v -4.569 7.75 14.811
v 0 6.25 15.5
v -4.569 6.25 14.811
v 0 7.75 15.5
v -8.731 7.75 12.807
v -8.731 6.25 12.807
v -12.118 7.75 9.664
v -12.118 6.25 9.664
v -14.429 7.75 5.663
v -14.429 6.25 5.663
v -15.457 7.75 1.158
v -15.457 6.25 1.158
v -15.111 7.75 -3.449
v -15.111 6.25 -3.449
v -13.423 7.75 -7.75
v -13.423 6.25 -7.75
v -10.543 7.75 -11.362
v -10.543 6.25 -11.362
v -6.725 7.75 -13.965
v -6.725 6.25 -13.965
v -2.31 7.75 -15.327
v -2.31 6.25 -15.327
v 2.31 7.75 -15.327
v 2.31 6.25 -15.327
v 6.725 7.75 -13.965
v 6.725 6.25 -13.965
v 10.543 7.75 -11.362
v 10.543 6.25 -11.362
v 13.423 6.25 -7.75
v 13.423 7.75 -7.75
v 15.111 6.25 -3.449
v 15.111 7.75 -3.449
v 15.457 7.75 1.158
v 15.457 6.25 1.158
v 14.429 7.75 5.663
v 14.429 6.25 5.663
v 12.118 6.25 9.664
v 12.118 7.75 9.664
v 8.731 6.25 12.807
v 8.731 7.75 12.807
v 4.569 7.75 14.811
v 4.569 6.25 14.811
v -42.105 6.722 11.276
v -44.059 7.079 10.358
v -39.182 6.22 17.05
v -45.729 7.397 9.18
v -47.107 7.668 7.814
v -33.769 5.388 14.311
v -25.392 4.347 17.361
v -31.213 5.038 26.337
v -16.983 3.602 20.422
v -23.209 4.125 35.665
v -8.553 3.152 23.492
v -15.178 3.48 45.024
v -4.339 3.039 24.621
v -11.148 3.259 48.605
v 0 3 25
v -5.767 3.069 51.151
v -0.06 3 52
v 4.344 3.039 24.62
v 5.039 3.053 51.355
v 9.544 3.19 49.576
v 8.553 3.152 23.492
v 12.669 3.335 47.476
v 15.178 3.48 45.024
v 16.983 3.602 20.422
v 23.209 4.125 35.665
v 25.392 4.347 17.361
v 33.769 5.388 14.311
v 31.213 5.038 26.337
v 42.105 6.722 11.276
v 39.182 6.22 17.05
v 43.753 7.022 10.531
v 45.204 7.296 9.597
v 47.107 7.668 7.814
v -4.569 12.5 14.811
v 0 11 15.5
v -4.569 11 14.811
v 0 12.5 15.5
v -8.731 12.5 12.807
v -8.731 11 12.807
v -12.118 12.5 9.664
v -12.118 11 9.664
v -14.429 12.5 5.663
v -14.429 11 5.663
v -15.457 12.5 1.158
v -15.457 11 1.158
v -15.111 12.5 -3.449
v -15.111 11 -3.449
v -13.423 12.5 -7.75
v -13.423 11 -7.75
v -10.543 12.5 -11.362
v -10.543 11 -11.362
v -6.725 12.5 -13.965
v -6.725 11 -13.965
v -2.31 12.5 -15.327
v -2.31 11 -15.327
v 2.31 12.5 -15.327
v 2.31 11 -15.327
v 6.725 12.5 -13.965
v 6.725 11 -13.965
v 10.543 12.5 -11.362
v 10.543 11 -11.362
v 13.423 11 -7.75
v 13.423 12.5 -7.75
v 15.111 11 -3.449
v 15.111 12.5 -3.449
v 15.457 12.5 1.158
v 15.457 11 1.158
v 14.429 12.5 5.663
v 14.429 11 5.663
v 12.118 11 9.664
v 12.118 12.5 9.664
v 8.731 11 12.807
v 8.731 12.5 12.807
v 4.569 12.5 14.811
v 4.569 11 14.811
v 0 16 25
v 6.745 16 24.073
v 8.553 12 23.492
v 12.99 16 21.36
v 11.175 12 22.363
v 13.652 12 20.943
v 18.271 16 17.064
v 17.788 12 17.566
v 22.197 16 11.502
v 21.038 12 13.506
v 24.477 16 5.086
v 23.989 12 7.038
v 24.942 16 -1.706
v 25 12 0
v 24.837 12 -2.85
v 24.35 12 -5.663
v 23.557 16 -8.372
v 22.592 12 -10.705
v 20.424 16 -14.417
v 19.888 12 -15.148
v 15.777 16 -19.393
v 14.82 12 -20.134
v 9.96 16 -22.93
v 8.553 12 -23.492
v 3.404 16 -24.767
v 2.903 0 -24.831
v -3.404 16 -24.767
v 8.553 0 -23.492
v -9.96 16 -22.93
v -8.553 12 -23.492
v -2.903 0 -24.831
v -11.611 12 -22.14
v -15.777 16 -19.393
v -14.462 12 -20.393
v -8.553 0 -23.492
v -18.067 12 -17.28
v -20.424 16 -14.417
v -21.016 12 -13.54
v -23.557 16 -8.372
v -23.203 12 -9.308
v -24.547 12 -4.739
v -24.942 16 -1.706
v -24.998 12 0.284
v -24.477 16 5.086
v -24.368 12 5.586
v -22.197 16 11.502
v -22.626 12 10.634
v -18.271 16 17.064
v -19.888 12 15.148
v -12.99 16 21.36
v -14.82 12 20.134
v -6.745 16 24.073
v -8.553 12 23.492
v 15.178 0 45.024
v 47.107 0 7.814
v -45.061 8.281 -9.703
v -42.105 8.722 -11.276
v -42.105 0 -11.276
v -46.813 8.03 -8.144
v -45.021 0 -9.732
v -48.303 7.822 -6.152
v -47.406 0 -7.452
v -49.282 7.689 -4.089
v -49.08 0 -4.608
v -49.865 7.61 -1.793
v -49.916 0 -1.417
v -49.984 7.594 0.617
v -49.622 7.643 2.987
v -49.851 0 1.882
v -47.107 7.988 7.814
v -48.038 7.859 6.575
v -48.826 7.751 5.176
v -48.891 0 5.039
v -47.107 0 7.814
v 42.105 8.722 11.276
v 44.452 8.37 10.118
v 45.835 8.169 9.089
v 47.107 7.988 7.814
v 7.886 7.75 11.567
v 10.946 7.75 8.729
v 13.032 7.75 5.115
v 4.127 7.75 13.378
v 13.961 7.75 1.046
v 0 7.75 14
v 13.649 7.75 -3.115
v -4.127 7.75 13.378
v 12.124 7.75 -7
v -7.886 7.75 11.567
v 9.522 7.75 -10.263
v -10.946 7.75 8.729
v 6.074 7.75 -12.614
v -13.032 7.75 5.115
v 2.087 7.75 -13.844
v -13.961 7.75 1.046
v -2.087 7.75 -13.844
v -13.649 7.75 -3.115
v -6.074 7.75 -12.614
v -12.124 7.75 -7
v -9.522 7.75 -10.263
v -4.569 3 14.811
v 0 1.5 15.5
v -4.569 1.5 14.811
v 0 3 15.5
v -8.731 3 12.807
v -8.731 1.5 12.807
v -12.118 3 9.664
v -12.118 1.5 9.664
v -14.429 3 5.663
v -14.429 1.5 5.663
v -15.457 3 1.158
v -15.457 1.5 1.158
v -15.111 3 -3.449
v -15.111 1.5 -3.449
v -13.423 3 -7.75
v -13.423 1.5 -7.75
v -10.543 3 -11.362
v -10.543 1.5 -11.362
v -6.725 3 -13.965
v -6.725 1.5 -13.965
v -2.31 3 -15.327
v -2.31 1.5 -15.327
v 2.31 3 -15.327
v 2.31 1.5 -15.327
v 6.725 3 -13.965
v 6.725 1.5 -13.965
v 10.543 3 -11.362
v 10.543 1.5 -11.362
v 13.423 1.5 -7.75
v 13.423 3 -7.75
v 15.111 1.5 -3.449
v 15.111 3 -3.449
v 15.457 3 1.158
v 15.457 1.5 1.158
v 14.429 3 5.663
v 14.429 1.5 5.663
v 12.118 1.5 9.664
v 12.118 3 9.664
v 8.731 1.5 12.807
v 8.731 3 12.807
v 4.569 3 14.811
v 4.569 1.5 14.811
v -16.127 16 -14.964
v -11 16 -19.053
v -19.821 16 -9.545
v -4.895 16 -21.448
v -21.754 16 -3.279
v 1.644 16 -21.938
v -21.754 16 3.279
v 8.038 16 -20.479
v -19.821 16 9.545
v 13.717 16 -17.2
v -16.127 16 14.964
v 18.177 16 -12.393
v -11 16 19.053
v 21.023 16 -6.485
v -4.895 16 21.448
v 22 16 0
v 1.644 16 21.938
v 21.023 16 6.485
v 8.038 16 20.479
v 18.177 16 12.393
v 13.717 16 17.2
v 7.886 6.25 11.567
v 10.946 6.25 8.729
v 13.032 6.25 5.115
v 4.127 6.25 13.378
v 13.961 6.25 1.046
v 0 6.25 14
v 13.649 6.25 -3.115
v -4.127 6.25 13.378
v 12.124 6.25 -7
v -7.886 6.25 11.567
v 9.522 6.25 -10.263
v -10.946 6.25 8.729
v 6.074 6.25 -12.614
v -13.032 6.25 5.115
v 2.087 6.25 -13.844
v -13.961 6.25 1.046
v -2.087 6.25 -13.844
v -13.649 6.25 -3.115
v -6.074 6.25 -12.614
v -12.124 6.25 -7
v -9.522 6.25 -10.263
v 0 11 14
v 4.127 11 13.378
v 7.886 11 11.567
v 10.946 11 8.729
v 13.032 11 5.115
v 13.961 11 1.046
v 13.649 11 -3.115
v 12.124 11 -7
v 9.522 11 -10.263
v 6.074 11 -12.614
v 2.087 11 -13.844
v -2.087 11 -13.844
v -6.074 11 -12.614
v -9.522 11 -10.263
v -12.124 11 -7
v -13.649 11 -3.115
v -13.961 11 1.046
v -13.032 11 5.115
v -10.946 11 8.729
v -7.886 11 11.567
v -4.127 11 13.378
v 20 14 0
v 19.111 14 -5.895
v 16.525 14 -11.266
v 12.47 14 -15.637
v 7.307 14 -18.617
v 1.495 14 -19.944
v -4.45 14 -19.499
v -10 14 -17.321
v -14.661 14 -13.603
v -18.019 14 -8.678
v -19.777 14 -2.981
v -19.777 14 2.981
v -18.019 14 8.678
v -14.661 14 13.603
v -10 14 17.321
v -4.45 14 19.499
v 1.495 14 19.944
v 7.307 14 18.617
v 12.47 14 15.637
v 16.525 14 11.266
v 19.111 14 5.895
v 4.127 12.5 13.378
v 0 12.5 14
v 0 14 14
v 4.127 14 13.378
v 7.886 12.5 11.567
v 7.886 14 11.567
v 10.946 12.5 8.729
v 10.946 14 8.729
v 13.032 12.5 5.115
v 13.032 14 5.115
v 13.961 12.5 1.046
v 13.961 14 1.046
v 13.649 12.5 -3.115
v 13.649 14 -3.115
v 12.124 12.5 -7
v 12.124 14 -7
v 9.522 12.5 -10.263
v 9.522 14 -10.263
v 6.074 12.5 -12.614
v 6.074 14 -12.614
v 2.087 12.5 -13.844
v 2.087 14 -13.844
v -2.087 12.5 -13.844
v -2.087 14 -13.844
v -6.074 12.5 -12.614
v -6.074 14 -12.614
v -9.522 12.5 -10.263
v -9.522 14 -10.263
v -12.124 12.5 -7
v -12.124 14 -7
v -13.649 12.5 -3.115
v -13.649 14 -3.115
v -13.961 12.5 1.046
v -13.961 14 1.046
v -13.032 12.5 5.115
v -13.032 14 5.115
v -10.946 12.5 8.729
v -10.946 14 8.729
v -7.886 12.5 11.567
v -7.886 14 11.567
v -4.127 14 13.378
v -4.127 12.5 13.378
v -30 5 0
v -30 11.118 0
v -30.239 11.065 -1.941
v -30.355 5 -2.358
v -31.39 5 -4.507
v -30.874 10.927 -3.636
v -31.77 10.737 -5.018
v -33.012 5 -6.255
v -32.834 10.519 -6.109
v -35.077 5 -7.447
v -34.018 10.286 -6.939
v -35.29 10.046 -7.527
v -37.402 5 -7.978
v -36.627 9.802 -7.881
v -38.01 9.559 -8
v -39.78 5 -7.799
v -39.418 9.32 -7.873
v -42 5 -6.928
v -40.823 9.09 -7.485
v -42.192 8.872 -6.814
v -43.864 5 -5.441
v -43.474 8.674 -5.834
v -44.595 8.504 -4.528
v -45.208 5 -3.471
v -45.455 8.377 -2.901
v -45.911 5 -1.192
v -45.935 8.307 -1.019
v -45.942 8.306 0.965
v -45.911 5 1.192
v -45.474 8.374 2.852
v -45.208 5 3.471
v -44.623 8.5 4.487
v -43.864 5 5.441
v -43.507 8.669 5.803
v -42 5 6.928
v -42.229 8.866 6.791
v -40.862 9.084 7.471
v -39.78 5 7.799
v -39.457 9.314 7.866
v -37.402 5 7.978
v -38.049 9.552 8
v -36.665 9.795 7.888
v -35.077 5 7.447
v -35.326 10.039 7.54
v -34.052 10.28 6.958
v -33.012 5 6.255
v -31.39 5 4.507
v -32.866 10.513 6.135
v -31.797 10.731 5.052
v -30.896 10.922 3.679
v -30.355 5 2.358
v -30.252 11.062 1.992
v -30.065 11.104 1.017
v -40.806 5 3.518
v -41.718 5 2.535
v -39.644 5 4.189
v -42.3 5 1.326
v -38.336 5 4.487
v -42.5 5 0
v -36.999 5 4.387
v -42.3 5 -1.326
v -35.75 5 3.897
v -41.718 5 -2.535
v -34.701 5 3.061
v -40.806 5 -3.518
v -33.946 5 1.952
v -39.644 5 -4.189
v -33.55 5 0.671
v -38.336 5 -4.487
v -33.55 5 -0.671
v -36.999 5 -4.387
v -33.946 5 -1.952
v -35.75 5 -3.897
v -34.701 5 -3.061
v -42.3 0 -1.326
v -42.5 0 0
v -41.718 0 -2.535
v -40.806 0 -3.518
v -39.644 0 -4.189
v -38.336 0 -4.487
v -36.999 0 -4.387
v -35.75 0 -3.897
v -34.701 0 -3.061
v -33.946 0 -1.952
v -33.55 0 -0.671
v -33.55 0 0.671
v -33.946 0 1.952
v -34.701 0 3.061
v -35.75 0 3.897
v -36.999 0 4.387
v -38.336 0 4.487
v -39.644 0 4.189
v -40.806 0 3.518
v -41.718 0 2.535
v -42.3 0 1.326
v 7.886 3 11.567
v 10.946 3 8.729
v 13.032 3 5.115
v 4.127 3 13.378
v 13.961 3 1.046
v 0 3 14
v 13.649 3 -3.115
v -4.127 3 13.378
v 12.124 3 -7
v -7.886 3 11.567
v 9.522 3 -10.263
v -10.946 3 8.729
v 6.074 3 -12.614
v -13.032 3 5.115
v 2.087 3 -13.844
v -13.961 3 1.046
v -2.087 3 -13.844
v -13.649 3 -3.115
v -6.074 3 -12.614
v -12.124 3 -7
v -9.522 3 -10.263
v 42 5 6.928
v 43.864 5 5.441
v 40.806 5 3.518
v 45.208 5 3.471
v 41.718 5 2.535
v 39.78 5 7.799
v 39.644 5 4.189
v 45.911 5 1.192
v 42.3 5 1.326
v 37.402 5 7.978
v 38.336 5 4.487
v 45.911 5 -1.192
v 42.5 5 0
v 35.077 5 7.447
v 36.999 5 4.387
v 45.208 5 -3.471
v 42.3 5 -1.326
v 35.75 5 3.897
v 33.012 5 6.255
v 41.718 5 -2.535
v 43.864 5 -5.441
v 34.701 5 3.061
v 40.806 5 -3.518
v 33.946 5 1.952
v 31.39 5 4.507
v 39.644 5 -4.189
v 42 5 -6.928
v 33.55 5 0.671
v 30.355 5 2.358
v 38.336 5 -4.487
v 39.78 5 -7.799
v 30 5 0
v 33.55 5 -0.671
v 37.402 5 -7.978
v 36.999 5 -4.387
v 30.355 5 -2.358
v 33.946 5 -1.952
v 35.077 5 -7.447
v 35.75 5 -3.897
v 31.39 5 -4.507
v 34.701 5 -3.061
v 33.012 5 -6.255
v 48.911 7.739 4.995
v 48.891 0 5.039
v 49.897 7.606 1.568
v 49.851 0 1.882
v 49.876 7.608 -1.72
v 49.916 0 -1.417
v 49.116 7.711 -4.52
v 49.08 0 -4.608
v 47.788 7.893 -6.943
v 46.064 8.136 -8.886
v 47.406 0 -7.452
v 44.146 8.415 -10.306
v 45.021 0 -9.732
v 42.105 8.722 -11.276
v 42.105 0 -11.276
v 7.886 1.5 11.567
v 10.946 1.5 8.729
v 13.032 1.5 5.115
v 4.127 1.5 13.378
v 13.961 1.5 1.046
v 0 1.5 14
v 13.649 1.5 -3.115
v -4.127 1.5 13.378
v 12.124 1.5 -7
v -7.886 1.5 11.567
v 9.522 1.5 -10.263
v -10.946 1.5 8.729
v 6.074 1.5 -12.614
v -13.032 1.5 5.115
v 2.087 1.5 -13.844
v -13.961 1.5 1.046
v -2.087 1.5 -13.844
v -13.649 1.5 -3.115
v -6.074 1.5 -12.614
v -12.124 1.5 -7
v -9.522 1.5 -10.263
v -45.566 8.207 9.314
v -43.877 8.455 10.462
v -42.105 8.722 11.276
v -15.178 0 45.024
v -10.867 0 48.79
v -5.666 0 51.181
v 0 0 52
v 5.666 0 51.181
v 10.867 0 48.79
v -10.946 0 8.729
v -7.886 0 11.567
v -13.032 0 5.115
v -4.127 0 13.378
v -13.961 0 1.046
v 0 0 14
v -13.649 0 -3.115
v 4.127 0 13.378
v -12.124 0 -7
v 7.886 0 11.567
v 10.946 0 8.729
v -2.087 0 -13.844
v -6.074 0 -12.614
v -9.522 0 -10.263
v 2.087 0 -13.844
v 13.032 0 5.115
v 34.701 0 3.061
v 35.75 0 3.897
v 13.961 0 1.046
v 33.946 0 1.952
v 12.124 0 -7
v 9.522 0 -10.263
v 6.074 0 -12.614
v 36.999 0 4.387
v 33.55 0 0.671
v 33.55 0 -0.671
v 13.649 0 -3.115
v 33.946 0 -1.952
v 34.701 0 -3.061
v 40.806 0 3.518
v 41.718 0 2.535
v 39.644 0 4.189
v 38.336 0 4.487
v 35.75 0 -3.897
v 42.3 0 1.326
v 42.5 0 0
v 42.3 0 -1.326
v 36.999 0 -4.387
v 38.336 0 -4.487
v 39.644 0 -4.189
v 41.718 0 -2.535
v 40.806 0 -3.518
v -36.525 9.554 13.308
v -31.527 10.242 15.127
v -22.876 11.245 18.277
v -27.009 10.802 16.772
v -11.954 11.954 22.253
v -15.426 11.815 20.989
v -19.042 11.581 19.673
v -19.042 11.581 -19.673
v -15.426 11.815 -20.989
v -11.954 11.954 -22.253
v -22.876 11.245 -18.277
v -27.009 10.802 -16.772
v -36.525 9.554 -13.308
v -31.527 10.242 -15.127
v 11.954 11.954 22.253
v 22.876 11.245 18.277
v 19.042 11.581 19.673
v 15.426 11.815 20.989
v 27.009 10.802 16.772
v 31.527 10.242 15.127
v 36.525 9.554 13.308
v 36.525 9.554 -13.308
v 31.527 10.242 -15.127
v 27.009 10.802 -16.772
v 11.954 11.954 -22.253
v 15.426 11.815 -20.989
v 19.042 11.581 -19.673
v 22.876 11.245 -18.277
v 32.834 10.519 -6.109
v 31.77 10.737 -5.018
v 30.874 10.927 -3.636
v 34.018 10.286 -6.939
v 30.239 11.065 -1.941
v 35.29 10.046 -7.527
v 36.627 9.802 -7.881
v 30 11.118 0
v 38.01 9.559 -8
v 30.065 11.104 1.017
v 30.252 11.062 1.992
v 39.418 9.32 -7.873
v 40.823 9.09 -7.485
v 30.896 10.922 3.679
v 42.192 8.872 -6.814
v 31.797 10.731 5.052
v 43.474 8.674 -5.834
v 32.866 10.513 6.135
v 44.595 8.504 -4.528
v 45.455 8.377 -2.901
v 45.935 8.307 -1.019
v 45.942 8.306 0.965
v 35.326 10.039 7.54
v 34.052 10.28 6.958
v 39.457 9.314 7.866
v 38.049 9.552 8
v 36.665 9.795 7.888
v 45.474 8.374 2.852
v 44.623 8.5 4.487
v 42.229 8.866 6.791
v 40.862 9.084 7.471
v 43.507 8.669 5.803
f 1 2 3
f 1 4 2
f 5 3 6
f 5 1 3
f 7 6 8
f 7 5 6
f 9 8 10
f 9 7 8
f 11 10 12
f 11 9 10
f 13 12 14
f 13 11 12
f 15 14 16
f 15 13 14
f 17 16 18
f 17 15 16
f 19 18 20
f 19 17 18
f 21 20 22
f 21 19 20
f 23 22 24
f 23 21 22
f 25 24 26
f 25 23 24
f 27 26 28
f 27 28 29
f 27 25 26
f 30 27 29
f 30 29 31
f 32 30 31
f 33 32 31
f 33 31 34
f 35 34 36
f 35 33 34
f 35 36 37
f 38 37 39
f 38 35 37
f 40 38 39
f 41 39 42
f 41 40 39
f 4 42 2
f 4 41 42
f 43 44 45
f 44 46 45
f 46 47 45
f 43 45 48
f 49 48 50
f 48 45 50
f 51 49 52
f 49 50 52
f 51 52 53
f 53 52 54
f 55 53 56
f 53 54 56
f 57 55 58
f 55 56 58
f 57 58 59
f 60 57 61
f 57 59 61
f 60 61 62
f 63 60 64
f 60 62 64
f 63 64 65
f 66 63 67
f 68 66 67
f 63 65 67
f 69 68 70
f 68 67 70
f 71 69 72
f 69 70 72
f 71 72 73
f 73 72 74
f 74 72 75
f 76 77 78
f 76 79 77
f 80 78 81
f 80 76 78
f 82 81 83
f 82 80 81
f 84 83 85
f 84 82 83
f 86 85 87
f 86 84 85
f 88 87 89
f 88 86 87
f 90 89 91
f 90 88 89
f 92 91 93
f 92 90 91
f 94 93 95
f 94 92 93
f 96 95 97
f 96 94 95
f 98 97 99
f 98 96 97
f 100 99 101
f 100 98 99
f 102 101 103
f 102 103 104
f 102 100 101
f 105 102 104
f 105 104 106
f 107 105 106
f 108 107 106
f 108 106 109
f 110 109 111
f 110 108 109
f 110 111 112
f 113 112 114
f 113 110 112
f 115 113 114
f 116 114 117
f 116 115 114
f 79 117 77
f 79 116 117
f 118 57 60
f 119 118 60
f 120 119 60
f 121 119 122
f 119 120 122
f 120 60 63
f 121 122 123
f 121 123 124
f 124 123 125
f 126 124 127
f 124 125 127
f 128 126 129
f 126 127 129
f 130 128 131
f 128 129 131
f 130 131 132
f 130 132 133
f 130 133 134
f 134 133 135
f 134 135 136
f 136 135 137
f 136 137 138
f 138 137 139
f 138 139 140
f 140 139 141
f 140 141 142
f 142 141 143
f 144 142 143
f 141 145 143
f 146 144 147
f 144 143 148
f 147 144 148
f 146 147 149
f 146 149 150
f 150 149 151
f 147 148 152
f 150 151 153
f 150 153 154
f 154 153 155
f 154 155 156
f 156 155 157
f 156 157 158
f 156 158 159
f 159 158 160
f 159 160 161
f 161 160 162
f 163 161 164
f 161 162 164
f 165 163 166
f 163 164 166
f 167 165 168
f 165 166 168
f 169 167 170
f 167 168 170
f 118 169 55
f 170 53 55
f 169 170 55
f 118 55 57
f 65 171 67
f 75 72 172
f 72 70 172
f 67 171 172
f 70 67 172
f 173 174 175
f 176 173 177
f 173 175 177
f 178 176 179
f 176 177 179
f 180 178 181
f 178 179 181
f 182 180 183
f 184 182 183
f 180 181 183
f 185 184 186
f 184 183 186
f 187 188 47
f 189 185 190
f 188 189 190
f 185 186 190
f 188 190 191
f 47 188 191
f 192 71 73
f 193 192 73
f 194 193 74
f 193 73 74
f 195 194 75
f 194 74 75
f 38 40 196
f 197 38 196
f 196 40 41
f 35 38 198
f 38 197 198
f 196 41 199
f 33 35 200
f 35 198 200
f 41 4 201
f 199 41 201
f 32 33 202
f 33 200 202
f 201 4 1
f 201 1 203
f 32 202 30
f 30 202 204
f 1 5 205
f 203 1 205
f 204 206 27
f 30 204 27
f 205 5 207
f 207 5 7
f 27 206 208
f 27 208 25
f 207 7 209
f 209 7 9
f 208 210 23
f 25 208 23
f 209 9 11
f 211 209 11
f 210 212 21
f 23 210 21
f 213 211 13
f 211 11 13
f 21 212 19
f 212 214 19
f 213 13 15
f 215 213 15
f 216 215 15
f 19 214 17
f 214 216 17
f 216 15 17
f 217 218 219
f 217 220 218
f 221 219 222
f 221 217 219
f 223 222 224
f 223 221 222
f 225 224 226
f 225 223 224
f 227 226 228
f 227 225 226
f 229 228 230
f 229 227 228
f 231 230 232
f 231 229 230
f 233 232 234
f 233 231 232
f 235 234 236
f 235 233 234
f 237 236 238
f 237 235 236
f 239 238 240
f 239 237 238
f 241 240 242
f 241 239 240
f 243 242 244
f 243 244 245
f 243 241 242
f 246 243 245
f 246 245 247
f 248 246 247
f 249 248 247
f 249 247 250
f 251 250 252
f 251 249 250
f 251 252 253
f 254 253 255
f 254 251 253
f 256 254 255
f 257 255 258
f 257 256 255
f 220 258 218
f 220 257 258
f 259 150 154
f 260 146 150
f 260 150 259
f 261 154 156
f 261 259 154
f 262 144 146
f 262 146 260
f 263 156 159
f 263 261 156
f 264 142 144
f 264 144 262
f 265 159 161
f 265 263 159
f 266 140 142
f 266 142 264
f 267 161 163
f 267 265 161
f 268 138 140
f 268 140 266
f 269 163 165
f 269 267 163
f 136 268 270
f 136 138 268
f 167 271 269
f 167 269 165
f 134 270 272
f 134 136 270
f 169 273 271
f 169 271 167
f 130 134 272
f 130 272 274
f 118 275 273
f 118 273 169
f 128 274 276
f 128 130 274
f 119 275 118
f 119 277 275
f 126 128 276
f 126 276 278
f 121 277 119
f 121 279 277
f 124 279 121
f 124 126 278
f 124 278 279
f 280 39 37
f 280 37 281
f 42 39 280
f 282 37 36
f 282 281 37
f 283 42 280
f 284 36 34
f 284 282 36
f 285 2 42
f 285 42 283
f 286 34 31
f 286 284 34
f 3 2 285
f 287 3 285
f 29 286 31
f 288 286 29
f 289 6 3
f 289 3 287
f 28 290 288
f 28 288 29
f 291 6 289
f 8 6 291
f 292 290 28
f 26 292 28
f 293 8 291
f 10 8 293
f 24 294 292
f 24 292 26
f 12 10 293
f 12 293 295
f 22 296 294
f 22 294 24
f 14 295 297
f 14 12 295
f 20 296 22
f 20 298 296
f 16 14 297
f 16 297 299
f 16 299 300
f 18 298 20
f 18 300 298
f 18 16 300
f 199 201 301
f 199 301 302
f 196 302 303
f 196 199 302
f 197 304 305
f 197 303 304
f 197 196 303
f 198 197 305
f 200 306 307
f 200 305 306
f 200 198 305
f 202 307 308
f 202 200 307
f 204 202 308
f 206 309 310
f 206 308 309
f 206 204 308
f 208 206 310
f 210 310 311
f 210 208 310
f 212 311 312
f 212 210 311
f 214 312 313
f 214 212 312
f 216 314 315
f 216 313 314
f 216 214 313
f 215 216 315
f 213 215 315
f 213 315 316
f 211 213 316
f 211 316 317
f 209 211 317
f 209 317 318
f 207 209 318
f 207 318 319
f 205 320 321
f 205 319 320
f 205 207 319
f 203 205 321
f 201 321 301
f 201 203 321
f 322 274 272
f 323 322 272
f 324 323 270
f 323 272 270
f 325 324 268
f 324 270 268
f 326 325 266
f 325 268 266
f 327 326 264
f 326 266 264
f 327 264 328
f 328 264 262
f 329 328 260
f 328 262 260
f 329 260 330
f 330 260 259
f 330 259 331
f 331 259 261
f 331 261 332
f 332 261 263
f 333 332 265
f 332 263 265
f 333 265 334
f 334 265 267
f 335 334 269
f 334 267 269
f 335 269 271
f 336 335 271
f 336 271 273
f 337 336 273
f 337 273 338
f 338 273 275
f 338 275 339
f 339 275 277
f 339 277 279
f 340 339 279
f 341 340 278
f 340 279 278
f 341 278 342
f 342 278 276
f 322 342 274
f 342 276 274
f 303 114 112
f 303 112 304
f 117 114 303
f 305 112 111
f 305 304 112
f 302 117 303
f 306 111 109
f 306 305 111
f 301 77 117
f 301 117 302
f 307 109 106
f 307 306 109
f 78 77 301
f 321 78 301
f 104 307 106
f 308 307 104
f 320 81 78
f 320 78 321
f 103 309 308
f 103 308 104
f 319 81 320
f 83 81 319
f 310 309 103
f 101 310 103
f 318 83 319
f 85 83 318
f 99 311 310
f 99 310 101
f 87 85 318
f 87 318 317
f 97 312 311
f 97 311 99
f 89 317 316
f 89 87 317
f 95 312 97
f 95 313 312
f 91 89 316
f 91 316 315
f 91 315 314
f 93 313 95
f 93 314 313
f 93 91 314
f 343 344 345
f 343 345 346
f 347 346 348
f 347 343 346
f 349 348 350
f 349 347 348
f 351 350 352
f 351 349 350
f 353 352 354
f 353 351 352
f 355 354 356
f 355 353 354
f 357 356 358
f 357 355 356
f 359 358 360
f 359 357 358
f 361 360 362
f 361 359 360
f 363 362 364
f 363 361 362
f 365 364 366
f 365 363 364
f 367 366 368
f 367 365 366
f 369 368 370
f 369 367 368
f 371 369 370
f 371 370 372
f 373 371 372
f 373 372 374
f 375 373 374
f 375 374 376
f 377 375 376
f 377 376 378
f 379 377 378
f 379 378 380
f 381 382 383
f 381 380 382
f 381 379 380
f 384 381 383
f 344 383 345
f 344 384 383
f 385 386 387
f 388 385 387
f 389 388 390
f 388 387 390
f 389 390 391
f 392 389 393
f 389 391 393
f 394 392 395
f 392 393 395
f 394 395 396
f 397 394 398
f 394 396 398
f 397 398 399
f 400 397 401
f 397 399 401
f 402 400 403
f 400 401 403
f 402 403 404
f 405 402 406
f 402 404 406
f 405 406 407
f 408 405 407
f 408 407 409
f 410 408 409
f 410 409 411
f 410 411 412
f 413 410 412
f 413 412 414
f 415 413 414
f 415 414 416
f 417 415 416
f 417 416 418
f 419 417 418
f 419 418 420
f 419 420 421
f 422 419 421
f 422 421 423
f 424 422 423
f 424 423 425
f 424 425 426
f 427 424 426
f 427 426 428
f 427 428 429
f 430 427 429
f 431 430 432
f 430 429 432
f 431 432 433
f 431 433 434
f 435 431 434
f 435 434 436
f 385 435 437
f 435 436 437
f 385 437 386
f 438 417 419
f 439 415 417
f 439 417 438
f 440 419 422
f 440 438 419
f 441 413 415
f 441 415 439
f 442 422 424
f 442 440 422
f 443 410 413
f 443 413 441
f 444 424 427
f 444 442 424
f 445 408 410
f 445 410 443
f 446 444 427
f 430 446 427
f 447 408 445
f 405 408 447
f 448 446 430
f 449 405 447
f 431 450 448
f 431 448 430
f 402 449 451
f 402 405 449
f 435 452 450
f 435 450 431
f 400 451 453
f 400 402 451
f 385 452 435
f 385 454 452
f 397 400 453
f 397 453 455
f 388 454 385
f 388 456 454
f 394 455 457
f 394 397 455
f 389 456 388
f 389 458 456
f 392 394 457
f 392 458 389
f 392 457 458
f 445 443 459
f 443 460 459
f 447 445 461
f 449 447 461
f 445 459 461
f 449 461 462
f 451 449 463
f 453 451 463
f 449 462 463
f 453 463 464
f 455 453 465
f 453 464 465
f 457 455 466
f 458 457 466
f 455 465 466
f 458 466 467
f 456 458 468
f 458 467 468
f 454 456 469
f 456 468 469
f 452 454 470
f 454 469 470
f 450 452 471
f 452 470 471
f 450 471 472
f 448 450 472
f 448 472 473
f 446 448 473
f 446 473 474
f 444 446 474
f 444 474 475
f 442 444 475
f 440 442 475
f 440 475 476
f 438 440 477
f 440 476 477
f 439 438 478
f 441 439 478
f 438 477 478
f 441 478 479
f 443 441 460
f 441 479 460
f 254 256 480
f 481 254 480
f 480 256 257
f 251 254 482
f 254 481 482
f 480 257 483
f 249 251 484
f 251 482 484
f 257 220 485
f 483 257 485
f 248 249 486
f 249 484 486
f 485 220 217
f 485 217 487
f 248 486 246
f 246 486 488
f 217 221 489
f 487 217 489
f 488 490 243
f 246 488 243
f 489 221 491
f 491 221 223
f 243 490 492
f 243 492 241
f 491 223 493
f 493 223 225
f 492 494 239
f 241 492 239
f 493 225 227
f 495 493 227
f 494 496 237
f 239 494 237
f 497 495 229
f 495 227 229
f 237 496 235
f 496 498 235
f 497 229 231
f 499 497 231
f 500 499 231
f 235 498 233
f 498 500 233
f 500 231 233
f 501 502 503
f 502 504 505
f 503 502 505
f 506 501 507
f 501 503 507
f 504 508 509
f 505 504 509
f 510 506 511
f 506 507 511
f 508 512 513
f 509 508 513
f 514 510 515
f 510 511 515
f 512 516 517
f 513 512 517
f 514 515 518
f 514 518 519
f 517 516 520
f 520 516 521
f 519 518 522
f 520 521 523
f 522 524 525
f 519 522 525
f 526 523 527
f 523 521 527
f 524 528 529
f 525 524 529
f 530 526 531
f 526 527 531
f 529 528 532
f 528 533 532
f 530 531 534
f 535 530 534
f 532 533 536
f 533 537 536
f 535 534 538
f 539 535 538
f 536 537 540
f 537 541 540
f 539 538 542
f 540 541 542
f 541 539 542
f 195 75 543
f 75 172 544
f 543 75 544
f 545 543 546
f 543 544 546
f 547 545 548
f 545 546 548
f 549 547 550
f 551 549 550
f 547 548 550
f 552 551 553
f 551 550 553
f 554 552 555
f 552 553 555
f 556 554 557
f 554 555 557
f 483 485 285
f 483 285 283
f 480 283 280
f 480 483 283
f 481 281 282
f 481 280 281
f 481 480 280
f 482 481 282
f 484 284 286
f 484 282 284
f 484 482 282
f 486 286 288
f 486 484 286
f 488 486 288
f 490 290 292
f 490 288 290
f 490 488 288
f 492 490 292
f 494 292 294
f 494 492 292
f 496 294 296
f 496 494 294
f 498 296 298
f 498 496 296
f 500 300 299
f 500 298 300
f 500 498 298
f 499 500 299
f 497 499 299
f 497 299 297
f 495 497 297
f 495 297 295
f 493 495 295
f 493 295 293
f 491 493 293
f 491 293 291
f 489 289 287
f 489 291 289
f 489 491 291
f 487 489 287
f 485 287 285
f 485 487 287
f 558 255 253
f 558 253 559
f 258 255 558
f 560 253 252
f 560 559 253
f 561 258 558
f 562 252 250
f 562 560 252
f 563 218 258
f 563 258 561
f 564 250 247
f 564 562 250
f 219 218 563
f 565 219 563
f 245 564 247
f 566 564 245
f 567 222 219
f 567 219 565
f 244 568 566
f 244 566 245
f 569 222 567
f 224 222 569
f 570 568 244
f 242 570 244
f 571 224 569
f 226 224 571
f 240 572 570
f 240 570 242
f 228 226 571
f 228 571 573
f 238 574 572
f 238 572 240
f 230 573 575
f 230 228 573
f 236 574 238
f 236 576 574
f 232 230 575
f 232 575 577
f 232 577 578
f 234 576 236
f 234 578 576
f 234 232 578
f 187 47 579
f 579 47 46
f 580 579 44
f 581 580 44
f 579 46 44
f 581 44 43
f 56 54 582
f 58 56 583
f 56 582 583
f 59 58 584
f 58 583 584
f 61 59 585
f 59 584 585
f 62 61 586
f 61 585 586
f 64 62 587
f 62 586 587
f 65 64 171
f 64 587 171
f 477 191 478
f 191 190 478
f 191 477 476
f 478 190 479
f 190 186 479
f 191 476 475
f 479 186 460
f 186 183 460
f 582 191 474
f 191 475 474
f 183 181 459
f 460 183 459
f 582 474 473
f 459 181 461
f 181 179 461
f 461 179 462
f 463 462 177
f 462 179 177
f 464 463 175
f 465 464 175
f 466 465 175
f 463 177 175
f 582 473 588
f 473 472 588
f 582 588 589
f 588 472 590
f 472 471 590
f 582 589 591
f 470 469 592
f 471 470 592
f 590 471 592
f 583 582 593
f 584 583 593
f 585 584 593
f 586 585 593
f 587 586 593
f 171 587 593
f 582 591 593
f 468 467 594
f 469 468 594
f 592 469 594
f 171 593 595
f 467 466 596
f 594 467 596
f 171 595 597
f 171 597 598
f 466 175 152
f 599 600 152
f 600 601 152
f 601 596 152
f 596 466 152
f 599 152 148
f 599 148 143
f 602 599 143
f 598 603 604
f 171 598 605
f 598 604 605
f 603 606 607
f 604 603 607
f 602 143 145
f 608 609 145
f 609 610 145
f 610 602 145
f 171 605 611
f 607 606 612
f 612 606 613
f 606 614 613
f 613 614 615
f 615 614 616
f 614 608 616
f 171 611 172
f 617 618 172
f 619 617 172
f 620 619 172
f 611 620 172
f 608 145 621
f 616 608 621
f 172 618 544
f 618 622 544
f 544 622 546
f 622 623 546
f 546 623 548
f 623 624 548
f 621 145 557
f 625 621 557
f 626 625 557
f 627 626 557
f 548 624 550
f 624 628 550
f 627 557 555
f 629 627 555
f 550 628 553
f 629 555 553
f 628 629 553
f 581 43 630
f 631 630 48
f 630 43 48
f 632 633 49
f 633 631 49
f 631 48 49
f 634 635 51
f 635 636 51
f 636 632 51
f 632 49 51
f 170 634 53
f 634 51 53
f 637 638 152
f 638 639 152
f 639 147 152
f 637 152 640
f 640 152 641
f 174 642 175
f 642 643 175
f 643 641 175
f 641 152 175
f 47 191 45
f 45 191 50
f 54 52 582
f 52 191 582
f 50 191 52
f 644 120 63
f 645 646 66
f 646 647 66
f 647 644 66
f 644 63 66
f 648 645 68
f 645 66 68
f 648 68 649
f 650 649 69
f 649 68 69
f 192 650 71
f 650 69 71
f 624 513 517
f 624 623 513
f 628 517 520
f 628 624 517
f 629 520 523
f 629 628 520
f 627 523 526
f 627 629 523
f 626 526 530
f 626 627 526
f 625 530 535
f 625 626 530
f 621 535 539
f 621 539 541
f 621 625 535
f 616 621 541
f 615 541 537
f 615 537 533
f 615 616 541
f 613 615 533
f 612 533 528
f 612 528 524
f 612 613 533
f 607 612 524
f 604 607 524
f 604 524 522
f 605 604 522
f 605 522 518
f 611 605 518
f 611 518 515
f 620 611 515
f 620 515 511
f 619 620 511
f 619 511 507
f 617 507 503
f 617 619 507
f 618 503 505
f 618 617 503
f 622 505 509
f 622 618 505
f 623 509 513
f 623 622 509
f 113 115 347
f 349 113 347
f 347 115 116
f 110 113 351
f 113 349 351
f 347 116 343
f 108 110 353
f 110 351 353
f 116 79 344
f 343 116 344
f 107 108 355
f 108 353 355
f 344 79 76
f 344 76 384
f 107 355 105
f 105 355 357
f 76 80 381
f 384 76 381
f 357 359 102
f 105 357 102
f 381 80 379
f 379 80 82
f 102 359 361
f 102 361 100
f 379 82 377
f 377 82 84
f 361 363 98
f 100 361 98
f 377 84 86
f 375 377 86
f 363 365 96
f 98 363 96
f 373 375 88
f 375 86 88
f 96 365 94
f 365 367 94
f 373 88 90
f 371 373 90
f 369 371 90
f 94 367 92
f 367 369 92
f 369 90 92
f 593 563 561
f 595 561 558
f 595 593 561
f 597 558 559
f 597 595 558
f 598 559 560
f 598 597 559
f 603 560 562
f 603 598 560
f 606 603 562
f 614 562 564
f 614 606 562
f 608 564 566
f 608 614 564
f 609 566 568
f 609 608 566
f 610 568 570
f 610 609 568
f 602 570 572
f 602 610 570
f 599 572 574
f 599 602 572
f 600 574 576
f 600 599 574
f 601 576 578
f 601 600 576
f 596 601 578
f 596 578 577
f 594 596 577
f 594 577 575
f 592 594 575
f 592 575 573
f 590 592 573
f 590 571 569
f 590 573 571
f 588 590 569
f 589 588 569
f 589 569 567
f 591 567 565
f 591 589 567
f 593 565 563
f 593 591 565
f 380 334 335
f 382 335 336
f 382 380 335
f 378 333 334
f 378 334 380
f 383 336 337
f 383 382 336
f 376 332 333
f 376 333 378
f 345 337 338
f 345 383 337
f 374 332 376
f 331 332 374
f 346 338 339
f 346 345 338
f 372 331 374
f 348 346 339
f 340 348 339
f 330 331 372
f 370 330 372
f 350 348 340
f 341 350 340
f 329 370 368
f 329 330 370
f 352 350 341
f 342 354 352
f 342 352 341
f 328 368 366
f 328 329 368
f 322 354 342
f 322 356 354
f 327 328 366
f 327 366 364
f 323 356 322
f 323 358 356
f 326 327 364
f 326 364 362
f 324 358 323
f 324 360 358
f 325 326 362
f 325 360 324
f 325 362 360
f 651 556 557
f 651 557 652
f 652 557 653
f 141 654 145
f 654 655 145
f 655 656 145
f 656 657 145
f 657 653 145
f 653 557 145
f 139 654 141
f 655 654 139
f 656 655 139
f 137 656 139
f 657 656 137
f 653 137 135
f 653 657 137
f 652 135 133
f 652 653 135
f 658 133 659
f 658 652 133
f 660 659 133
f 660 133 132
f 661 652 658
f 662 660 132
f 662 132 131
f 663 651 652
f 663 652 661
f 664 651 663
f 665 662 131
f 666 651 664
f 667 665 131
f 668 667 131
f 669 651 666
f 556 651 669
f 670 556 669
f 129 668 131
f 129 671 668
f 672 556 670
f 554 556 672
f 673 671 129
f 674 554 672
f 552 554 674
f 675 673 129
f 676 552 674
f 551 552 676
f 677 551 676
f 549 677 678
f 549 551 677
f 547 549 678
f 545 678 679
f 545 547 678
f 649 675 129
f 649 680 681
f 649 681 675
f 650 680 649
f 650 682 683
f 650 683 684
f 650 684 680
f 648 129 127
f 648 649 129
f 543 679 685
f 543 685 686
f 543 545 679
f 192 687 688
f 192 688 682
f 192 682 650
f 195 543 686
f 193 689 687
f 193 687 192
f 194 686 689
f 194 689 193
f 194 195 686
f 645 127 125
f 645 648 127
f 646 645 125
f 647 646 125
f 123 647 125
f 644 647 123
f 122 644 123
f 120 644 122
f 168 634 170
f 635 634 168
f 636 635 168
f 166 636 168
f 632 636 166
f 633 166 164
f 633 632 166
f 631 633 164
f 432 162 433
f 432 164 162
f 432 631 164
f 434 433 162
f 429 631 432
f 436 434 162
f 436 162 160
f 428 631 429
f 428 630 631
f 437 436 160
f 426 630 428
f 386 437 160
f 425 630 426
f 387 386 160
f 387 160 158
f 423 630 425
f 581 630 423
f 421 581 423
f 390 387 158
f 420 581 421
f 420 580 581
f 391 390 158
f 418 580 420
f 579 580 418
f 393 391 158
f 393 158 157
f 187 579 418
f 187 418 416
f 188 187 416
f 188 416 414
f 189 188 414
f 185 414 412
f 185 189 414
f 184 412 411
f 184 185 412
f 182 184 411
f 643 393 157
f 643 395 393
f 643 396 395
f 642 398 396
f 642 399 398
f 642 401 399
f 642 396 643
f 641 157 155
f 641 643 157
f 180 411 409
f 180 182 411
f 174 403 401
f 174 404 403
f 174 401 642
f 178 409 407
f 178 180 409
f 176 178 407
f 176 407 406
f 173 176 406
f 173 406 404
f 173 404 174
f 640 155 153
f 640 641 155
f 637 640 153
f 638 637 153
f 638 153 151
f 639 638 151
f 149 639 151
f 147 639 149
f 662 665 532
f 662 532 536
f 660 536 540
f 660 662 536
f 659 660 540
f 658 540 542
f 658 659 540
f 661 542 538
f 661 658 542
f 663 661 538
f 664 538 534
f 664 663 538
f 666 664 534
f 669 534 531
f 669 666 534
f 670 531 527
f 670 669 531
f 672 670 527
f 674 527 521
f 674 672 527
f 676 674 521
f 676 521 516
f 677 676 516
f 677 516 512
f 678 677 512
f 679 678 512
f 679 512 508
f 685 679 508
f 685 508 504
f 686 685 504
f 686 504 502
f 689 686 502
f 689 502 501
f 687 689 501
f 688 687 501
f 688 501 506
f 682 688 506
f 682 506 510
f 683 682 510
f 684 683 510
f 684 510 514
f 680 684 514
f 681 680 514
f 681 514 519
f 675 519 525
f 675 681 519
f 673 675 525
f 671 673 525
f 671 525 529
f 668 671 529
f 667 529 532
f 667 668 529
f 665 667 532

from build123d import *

# Parameters (mm, degrees)
SKETCH_1_R                   = 25
SKETCH_1_R_2                 = 14
EXTRUDE_1_DEPTH              = 16
EXTRUDE_3_REACH              = 40.807
EXTRUDE_4_REACH              = 60.146
EXTRUDE_4_END_RADIUS         = 240
HOLE_WIZARD_M8_1_D           = 9
HOLE_WIZARD_M8_1_CBORE_D     = 16
HOLE_WIZARD_M8_1_CBORE_DEPTH = 11
CUT_EXTRUDE_START            = 16
SKETCH_15_R                  = 22
CUT_EXTRUDE_1_DEPTH          = 2
CUT_EXTRUDE_1_DRAFT          = -45
SKETCH_16_W                  = 1.5
SKETCH_16_H                  = 1.5
PATTERN_LINEAR_1_COUNT       = 3
PATTERN_LINEAR_1_PITCH       = 4.75


with BuildPart() as part:
    # 草图1 → 凸台-拉伸1 (new body)
    with BuildSketch(Plane(origin=(0, 0, 0), x_dir=(1, 0, 0), z_dir=(0, 1, 0))):
        with Locations(Location((0, 0, 0), (0, 0, 270))):
            Circle(SKETCH_1_R)
        with Locations(Location((0, 0, 0), (0, 0, 270))):
            Circle(SKETCH_1_R_2, mode=Mode.SUBTRACT)
    extrude(amount=EXTRUDE_1_DEPTH)

    # 凸台-拉伸3: up to this cone (the profile starts inside it)
    extrude_3_end = Plane(origin=(0, 0, 0), z_dir=(0, -1, 0)).offset(-16.408173518) * Cone(5.671e-06, 855.062315179, 150.770555353, align=(Align.CENTER, Align.CENTER, Align.MIN), mode=Mode.PRIVATE)
    # 草图1<4> → 凸台-拉伸3 (add, up to the surface)
    with BuildSketch(Plane(origin=(0, 0, 0), x_dir=(1, 0, 0), z_dir=(0, 1, 0)), mode=Mode.PRIVATE) as extrude_3_sk1:
        with BuildLine():
            Line((42.105263158, 11.275939624), (8.552631579, 23.491540883))
            ThreePointArc((8.552631579, 23.491540883), (20.479450548, 14.338483367), (25, 0))
            ThreePointArc((25, 0), (20.479450548, -14.338483367), (8.552631579, -23.491540883))
            Line((8.552631579, -23.491540883), (42.105263158, -11.275939624))
            ThreePointArc((42.105263158, -11.275939624), (44.829030594, -9.867337085), (47.10686849, -7.814406331))
            ThreePointArc((47.10686849, -7.814406331), (49.60820541, 3.041310105), (42.105263158, 11.275939624))
        make_face()
    extrude_3_tool1 = extrude(extrude_3_sk1.sketch, amount=EXTRUDE_3_REACH, mode=Mode.PRIVATE) & extrude_3_end
    add(extrude_3_tool1.solids().sort_by_distance((33.391095, 0, 0))[0])
    # 草图1<4> → 凸台-拉伸3 (add, up to the surface)
    with BuildSketch(Plane(origin=(0, 0, 0), x_dir=(1, 0, 0), z_dir=(0, 1, 0)), mode=Mode.PRIVATE) as extrude_3_sk2:
        with BuildLine():
            Line((-8.552631579, 23.491540883), (-42.105263158, 11.275939624))
            ThreePointArc((-42.105263158, 11.275939624), (-49.60820541, 3.041310105), (-47.10686849, -7.814406331))
            ThreePointArc((-47.10686849, -7.814406331), (-44.829030594, -9.867337085), (-42.105263158, -11.275939624))
            Line((-42.105263158, -11.275939624), (-8.552631579, -23.491540883))
            ThreePointArc((-8.552631579, -23.491540883), (-25, 0), (-8.552631579, 23.491540883))
        make_face()
    extrude_3_tool2 = extrude(extrude_3_sk2.sketch, amount=EXTRUDE_3_REACH, mode=Mode.PRIVATE) & extrude_3_end
    add(extrude_3_tool2.solids().sort_by_distance((-33.391095, 0, 0))[0])

    # 凸台-拉伸4: up to this cylinder (the profile starts outside it)
    extrude_4_end = Plane(origin=(0, 243, 31.3806), z_dir=(0, 0, 1)) * Cylinder(EXTRUDE_4_END_RADIUS, 601.292, mode=Mode.PRIVATE)
    # 草图1<7> → 凸台-拉伸4 (add, up to the surface)
    with BuildSketch(Plane(origin=(0, 0, 0), x_dir=(1, 0, 0), z_dir=(0, 1, 0)), mode=Mode.PRIVATE) as extrude_4_sk1:
        with BuildLine():
            ThreePointArc((-42.105263158, -11.275939624), (-44.829030594, -9.867337085), (-47.10686849, -7.814406331))
            Line((-47.10686849, -7.814406331), (-15.178114149, -45.024010552))
            ThreePointArc((-15.178114149, -45.024010552), (0, -52), (15.178114149, -45.024010552))
            Line((15.178114149, -45.024010552), (47.10686849, -7.814406331))
            ThreePointArc((47.10686849, -7.814406331), (44.829030594, -9.867337085), (42.105263158, -11.275939624))
            Line((42.105263158, -11.275939624), (8.552631579, -23.491540883))
            ThreePointArc((8.552631579, -23.491540883), (0, -25), (-8.552631579, -23.491540883))
            Line((-8.552631579, -23.491540883), (-42.105263158, -11.275939624))
        make_face()
    extrude_4_tool1 = extrude(extrude_4_sk1.sketch, amount=EXTRUDE_4_REACH, mode=Mode.PRIVATE) - extrude_4_end
    add(extrude_4_tool1.solids().sort_by_distance((0, 0, 31.3806))[0])

    # M8 六角头螺栓的柱形沉头孔1 (through all)
    with Locations(Plane(origin=(0, 16, 0), x_dir=(1, 0, 0), z_dir=(0, 1, 0))):
        with Locations((-38, 0)):
            hole_wizard_m8_1 = CounterBoreHole(HOLE_WIZARD_M8_1_D / 2, HOLE_WIZARD_M8_1_CBORE_D / 2, HOLE_WIZARD_M8_1_CBORE_DEPTH)

    # 镜向1: M8 六角头螺栓的柱形沉头孔1 across plane
    add(hole_wizard_m8_1.mirror(Plane(origin=(0, 0, 0), x_dir=(0, 0, 1), z_dir=(1, 0, 0))), mode=Mode.SUBTRACT)


with BuildPart() as cut_extrude_1_tool:
    # 草图15 → 切除-拉伸1 (with draft: the straight prism first)
    with BuildSketch(Plane(origin=(0, 0, 0), x_dir=(1, 0, 0), z_dir=(0, 1, 0)).offset(CUT_EXTRUDE_START)):
        Circle(SKETCH_15_R)
    extrude(amount=-CUT_EXTRUDE_1_DEPTH)
    # 切除-拉伸1: the draft: its side faces are tilted about the plane it starts from
    cut_extrude_1_sides = [cut_extrude_1_tool.faces().sort_by_distance(p)[0] for p in [
        (-22, 15, 0),
    ]]
    draft(cut_extrude_1_sides, Plane(origin=(0, 0, 0), x_dir=(1, 0, 0), z_dir=(0, 1, 0)).offset(CUT_EXTRUDE_START), CUT_EXTRUDE_1_DRAFT)


with BuildPart() as part_1:
    add(part.part)

    # 切除-拉伸1: cut by cut_extrude_1_tool
    add(cut_extrude_1_tool.part, mode=Mode.SUBTRACT)

    # 草图16 → 切除-旋转5 (revolve, cut)
    with BuildSketch(Plane.XY, mode=Mode.PRIVATE) as cut_revolve_5_sk:
        with Locations((14.75, 11.75)):
            Rectangle(SKETCH_16_W, SKETCH_16_H)
    cut_revolve_5 = revolve(cut_revolve_5_sk.sketch.rotate(Axis((0, 21.806549083, 0), (0, -1, 0)), 90), axis=Axis((0, 21.806549083, 0), (0, -1, 0)), mode=Mode.SUBTRACT)

    # 阵列(线性)1: 切除-旋转5 ×3
    with Locations(*[(0, -i * PATTERN_LINEAR_1_PITCH, 0) for i in range(1, PATTERN_LINEAR_1_COUNT)]):
        add(cut_revolve_5, mode=Mode.SUBTRACT)


solid = part_1.part
